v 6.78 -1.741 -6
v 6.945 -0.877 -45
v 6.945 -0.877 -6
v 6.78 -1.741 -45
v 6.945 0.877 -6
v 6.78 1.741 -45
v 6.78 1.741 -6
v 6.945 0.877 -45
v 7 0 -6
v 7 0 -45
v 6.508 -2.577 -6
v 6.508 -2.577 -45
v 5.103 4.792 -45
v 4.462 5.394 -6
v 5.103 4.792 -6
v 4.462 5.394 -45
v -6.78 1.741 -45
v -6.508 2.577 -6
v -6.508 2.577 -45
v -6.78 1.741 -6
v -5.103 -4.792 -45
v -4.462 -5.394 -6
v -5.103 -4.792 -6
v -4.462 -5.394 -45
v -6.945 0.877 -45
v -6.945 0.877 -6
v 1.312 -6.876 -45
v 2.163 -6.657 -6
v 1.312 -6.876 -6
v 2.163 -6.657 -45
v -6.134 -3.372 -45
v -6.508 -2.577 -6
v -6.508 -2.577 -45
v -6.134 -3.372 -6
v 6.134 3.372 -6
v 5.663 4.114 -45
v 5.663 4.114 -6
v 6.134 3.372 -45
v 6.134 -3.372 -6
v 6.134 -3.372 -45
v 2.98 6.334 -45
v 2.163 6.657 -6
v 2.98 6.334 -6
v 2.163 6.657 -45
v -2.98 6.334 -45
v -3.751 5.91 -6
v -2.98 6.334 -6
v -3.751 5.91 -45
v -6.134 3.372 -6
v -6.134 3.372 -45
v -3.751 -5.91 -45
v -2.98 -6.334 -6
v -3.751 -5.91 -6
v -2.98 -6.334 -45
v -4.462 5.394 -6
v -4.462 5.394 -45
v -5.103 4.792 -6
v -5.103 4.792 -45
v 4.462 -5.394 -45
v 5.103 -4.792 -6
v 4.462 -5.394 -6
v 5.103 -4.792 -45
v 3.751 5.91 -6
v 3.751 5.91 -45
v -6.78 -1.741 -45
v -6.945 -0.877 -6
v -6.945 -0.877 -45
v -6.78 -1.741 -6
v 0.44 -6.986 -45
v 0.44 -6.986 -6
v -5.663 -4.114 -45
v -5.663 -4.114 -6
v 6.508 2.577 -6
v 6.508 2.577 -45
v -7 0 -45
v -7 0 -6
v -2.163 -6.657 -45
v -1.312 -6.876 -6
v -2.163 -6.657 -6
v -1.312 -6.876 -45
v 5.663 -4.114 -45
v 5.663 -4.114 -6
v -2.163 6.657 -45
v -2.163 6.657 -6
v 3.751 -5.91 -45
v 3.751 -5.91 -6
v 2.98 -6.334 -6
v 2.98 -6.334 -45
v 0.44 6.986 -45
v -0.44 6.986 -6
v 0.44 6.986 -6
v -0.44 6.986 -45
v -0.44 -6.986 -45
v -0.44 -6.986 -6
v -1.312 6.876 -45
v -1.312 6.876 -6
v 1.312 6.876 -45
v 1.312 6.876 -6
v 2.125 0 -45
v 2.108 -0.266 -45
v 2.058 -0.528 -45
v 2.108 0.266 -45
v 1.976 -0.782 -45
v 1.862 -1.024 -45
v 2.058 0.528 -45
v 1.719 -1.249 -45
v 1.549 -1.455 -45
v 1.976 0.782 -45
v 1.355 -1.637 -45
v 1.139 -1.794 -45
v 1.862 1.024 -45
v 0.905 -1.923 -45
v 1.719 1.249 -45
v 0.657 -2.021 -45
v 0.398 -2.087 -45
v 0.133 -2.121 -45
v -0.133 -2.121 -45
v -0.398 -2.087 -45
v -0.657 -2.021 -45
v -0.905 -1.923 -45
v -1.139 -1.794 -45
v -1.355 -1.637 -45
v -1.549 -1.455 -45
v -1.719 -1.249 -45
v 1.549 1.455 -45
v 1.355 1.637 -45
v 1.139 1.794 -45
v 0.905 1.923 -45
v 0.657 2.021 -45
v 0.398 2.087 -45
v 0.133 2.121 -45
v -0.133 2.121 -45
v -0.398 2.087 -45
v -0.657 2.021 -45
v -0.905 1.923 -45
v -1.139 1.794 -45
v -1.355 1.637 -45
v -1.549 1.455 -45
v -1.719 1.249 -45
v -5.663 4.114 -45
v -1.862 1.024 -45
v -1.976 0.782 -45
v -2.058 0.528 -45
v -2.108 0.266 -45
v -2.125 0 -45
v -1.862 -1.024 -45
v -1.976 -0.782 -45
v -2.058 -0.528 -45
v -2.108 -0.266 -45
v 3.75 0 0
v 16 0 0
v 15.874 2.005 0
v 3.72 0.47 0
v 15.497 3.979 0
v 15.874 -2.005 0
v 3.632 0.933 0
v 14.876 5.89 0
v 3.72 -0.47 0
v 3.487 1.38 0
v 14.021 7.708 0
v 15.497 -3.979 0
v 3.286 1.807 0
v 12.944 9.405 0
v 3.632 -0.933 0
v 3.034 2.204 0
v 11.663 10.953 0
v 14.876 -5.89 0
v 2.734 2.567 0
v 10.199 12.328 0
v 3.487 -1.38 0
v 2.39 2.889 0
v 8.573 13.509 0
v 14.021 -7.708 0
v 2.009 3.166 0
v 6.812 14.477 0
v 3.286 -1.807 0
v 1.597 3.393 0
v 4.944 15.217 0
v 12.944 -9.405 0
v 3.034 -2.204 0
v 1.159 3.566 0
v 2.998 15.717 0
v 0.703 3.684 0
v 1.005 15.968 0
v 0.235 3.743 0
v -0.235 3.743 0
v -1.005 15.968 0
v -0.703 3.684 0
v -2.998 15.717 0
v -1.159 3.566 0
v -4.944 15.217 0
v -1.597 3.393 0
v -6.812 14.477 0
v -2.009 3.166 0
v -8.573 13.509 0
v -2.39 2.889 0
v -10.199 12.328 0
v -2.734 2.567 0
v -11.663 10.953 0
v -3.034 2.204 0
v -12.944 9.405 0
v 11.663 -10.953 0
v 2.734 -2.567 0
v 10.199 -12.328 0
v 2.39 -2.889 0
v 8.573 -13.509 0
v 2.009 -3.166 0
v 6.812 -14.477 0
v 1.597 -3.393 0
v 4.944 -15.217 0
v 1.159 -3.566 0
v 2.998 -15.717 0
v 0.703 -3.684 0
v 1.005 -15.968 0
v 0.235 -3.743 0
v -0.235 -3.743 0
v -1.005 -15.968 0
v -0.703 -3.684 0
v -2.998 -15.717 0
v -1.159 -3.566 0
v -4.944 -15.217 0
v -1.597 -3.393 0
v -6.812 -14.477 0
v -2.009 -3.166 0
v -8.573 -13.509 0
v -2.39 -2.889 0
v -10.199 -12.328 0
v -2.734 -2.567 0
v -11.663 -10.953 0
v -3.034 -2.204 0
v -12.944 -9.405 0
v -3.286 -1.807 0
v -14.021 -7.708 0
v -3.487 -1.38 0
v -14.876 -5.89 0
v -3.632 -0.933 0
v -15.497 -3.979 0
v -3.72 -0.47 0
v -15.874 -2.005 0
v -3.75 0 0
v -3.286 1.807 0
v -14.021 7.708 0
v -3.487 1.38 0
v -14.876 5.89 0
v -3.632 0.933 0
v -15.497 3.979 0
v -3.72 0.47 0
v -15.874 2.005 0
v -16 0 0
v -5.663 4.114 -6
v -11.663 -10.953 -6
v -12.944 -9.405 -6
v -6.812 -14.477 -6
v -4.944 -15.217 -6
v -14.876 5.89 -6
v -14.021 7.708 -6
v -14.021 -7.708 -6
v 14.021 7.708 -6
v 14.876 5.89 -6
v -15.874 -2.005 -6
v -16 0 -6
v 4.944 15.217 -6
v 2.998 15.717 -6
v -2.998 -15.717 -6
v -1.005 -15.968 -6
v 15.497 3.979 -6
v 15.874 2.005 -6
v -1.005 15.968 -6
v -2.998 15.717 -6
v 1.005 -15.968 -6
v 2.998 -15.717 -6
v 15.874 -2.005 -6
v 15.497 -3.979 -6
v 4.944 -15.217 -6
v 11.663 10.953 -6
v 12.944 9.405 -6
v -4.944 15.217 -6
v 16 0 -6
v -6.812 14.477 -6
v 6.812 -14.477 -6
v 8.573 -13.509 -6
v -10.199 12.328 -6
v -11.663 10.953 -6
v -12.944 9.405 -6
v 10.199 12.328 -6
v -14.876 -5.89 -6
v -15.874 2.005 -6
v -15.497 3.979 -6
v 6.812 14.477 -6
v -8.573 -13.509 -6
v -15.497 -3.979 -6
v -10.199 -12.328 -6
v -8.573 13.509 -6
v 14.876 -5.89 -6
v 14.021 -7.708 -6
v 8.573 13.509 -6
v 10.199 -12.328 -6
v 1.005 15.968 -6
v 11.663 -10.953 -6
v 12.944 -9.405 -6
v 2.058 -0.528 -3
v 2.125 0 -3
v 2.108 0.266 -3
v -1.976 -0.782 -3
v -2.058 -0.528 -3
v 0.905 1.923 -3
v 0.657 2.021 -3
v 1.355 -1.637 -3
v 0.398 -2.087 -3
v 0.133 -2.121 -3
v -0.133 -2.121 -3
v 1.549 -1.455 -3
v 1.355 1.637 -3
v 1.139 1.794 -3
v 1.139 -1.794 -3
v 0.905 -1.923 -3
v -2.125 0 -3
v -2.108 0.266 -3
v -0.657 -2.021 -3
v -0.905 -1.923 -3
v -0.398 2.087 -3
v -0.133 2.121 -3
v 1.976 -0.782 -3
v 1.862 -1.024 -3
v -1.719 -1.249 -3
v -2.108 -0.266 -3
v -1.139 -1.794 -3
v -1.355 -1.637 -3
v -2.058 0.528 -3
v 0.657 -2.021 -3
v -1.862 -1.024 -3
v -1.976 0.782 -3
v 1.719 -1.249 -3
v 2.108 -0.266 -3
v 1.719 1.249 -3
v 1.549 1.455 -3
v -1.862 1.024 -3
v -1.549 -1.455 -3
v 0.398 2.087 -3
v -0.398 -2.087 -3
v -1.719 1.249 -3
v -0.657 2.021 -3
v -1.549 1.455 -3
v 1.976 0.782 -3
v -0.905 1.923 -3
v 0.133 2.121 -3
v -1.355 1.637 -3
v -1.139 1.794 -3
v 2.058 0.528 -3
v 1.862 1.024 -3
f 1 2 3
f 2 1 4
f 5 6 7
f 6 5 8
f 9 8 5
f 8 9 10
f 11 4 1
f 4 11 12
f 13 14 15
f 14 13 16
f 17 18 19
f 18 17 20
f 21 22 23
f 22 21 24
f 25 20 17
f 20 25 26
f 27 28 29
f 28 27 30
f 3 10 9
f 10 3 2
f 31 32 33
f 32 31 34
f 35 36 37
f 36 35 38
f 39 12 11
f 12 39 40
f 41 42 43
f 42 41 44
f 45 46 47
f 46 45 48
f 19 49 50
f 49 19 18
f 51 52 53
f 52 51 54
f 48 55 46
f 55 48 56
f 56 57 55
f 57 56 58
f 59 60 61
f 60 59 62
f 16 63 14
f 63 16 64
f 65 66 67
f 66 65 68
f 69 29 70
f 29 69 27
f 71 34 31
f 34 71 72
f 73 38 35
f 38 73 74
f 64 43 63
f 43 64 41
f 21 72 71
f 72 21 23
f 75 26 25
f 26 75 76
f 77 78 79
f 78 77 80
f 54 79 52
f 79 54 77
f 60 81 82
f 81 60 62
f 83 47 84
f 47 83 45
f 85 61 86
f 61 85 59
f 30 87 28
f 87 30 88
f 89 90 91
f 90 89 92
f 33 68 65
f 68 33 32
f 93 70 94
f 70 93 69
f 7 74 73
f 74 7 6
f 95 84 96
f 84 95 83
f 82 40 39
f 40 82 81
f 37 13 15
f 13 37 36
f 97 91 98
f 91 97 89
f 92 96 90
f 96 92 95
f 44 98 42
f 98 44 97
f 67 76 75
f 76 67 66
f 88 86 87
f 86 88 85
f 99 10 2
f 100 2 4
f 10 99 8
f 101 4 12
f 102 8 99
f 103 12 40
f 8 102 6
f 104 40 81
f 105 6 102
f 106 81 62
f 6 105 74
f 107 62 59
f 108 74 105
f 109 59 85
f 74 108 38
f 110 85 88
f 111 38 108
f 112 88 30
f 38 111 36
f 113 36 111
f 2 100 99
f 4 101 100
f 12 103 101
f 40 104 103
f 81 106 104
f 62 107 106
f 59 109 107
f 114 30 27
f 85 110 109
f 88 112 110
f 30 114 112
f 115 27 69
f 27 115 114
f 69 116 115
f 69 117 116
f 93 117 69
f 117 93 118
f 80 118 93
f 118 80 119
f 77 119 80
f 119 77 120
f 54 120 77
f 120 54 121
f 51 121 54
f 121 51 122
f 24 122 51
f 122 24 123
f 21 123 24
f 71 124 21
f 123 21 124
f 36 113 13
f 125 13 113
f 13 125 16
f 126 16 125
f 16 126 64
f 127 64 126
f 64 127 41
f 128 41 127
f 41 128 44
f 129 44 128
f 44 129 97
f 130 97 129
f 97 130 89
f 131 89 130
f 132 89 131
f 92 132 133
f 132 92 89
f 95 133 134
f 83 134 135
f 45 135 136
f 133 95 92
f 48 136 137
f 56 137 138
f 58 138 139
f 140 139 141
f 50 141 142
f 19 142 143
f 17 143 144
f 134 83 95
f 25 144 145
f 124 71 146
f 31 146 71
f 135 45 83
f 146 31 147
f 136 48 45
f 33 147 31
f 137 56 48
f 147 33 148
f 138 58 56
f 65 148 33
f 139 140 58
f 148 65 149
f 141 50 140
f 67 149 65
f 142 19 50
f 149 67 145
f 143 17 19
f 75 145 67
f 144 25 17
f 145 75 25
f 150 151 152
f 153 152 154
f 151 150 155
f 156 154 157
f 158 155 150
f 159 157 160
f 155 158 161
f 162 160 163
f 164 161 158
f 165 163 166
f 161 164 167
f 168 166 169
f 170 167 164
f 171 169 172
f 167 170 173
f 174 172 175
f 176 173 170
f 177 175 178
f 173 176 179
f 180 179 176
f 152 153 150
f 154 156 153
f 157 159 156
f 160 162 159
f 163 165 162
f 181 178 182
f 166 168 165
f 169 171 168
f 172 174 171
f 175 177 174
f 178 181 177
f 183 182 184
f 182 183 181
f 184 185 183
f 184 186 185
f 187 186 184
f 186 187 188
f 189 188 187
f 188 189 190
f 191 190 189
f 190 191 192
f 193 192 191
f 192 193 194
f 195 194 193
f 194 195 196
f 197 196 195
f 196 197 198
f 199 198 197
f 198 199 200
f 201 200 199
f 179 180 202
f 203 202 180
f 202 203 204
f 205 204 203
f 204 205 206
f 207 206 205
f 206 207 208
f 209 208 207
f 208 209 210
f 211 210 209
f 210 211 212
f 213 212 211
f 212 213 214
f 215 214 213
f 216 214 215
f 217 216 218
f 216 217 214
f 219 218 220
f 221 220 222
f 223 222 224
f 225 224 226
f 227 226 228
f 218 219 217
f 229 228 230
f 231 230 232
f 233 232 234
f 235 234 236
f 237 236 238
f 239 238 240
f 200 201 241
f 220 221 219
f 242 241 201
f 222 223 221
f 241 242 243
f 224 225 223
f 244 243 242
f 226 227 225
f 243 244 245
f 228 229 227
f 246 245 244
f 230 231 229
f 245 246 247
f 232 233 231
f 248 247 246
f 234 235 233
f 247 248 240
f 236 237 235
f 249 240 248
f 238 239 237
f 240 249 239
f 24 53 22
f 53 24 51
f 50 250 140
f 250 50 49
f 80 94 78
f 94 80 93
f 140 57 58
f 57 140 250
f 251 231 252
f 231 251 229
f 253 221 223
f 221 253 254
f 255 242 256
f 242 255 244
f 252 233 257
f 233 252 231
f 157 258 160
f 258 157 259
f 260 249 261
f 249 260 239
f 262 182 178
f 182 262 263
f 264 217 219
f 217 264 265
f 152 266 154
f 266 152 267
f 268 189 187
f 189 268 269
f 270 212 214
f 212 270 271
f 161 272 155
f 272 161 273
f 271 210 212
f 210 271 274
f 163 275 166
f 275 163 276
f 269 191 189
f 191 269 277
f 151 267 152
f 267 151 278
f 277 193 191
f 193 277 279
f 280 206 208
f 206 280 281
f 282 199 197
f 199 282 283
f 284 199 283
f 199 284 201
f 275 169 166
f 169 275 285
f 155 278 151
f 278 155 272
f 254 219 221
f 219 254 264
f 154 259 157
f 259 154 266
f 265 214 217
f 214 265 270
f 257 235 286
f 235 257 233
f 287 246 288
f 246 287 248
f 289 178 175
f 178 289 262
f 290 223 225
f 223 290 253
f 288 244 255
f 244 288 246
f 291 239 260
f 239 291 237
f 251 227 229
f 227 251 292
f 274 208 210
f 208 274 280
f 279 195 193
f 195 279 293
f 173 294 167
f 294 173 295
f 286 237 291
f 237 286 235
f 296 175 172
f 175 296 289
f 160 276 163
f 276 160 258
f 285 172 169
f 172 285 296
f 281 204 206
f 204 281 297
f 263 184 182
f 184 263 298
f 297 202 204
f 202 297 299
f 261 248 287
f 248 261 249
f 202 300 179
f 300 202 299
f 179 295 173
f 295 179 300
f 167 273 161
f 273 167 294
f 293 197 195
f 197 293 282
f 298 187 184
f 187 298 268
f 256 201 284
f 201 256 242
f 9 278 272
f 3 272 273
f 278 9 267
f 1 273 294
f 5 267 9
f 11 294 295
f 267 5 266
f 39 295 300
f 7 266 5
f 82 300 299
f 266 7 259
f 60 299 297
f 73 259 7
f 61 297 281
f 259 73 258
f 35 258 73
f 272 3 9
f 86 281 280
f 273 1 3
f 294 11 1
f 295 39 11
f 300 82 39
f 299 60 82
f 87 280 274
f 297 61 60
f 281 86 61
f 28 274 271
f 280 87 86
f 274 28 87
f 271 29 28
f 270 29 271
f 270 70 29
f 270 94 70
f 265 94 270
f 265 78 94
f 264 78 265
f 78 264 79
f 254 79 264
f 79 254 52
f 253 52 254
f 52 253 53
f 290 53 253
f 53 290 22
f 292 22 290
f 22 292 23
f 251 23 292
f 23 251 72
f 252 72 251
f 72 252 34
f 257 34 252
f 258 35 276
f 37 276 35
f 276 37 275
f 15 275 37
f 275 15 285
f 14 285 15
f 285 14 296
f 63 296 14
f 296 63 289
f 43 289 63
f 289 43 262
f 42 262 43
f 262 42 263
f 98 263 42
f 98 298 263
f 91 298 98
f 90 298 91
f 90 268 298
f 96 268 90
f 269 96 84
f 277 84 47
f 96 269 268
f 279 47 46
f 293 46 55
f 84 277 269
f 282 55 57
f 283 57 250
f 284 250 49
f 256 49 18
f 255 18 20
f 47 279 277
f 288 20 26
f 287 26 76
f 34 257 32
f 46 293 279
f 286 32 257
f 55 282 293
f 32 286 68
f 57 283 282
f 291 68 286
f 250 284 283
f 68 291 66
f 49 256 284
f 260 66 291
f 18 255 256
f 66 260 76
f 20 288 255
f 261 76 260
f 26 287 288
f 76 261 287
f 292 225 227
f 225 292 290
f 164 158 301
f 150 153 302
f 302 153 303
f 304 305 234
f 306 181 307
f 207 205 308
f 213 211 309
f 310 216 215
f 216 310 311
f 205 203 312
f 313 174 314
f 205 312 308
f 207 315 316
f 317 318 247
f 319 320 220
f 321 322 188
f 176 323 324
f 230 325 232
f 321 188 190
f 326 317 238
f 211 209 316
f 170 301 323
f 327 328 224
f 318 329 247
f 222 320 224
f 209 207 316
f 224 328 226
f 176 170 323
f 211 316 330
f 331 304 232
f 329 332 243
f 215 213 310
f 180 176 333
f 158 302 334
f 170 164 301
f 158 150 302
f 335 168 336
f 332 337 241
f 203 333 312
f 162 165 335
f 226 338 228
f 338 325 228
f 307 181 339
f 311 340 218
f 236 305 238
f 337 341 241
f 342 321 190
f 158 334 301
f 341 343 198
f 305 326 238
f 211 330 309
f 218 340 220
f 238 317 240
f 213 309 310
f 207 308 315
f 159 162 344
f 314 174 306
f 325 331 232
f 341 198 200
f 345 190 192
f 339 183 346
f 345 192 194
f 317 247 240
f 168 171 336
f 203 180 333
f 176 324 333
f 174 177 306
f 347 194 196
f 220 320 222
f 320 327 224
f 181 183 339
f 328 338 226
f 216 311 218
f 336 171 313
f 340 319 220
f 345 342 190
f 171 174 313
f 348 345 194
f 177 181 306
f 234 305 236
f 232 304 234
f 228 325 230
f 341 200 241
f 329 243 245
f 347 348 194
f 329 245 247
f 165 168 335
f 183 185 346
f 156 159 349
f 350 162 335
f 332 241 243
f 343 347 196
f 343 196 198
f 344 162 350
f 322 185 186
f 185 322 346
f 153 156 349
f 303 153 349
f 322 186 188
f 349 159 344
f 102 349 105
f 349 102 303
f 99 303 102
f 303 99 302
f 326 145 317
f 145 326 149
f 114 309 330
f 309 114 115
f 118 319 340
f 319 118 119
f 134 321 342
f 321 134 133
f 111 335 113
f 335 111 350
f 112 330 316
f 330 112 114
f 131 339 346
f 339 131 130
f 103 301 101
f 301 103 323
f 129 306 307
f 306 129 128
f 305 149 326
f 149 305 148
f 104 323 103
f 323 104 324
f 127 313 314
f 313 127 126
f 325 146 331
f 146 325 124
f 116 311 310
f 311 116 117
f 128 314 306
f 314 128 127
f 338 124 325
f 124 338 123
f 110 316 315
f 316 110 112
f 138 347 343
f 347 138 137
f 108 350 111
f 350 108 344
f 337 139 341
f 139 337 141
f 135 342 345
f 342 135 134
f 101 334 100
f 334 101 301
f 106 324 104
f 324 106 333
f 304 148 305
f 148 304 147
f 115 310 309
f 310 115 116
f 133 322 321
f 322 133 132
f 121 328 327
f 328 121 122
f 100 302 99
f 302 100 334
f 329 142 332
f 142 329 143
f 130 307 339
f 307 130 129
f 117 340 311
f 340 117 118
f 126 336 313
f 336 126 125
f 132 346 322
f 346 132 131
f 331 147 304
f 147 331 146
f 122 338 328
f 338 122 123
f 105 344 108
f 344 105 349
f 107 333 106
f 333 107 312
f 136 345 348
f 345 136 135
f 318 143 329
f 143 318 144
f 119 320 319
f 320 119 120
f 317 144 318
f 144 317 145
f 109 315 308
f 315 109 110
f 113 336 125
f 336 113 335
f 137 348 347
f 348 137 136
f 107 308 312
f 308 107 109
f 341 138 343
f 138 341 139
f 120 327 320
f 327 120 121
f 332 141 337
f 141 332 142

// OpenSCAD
$fn = 50;


difference() {
	union() {
		translate(v = [0, 0, -45.0000000000]) {
			cylinder(h = 45, r = 7.0000000000);
		}
		translate(v = [0, 0, -6.0000000000]) {
			cylinder(h = 6, r = 16.0000000000);
		}
	}
	union() {
		translate(v = [0, 0, 0]) {
			rotate(a = [0, 0, 0]) {
				difference() {
					union() {
						#translate(v = [0, 0, -45.0000000000]) {
							cylinder(h = 45, r = 2.0000000000);
						}
						#translate(v = [0, 0, -3]) {
							cylinder(h = 3, r = 7.0000000000, r1 = 2.1250000000, r2 = 3.7500000000);
						}
						#translate(v = [0, 0, -45.0000000000]) {
							cylinder(h = 45, r = 2.1250000000);
						}
						#translate(v = [0, 0, -45.0000000000]) {
							cylinder(h = 45, r = 2.0000000000);
						}
					}
					union();
				}
			}
		}
	}
}
